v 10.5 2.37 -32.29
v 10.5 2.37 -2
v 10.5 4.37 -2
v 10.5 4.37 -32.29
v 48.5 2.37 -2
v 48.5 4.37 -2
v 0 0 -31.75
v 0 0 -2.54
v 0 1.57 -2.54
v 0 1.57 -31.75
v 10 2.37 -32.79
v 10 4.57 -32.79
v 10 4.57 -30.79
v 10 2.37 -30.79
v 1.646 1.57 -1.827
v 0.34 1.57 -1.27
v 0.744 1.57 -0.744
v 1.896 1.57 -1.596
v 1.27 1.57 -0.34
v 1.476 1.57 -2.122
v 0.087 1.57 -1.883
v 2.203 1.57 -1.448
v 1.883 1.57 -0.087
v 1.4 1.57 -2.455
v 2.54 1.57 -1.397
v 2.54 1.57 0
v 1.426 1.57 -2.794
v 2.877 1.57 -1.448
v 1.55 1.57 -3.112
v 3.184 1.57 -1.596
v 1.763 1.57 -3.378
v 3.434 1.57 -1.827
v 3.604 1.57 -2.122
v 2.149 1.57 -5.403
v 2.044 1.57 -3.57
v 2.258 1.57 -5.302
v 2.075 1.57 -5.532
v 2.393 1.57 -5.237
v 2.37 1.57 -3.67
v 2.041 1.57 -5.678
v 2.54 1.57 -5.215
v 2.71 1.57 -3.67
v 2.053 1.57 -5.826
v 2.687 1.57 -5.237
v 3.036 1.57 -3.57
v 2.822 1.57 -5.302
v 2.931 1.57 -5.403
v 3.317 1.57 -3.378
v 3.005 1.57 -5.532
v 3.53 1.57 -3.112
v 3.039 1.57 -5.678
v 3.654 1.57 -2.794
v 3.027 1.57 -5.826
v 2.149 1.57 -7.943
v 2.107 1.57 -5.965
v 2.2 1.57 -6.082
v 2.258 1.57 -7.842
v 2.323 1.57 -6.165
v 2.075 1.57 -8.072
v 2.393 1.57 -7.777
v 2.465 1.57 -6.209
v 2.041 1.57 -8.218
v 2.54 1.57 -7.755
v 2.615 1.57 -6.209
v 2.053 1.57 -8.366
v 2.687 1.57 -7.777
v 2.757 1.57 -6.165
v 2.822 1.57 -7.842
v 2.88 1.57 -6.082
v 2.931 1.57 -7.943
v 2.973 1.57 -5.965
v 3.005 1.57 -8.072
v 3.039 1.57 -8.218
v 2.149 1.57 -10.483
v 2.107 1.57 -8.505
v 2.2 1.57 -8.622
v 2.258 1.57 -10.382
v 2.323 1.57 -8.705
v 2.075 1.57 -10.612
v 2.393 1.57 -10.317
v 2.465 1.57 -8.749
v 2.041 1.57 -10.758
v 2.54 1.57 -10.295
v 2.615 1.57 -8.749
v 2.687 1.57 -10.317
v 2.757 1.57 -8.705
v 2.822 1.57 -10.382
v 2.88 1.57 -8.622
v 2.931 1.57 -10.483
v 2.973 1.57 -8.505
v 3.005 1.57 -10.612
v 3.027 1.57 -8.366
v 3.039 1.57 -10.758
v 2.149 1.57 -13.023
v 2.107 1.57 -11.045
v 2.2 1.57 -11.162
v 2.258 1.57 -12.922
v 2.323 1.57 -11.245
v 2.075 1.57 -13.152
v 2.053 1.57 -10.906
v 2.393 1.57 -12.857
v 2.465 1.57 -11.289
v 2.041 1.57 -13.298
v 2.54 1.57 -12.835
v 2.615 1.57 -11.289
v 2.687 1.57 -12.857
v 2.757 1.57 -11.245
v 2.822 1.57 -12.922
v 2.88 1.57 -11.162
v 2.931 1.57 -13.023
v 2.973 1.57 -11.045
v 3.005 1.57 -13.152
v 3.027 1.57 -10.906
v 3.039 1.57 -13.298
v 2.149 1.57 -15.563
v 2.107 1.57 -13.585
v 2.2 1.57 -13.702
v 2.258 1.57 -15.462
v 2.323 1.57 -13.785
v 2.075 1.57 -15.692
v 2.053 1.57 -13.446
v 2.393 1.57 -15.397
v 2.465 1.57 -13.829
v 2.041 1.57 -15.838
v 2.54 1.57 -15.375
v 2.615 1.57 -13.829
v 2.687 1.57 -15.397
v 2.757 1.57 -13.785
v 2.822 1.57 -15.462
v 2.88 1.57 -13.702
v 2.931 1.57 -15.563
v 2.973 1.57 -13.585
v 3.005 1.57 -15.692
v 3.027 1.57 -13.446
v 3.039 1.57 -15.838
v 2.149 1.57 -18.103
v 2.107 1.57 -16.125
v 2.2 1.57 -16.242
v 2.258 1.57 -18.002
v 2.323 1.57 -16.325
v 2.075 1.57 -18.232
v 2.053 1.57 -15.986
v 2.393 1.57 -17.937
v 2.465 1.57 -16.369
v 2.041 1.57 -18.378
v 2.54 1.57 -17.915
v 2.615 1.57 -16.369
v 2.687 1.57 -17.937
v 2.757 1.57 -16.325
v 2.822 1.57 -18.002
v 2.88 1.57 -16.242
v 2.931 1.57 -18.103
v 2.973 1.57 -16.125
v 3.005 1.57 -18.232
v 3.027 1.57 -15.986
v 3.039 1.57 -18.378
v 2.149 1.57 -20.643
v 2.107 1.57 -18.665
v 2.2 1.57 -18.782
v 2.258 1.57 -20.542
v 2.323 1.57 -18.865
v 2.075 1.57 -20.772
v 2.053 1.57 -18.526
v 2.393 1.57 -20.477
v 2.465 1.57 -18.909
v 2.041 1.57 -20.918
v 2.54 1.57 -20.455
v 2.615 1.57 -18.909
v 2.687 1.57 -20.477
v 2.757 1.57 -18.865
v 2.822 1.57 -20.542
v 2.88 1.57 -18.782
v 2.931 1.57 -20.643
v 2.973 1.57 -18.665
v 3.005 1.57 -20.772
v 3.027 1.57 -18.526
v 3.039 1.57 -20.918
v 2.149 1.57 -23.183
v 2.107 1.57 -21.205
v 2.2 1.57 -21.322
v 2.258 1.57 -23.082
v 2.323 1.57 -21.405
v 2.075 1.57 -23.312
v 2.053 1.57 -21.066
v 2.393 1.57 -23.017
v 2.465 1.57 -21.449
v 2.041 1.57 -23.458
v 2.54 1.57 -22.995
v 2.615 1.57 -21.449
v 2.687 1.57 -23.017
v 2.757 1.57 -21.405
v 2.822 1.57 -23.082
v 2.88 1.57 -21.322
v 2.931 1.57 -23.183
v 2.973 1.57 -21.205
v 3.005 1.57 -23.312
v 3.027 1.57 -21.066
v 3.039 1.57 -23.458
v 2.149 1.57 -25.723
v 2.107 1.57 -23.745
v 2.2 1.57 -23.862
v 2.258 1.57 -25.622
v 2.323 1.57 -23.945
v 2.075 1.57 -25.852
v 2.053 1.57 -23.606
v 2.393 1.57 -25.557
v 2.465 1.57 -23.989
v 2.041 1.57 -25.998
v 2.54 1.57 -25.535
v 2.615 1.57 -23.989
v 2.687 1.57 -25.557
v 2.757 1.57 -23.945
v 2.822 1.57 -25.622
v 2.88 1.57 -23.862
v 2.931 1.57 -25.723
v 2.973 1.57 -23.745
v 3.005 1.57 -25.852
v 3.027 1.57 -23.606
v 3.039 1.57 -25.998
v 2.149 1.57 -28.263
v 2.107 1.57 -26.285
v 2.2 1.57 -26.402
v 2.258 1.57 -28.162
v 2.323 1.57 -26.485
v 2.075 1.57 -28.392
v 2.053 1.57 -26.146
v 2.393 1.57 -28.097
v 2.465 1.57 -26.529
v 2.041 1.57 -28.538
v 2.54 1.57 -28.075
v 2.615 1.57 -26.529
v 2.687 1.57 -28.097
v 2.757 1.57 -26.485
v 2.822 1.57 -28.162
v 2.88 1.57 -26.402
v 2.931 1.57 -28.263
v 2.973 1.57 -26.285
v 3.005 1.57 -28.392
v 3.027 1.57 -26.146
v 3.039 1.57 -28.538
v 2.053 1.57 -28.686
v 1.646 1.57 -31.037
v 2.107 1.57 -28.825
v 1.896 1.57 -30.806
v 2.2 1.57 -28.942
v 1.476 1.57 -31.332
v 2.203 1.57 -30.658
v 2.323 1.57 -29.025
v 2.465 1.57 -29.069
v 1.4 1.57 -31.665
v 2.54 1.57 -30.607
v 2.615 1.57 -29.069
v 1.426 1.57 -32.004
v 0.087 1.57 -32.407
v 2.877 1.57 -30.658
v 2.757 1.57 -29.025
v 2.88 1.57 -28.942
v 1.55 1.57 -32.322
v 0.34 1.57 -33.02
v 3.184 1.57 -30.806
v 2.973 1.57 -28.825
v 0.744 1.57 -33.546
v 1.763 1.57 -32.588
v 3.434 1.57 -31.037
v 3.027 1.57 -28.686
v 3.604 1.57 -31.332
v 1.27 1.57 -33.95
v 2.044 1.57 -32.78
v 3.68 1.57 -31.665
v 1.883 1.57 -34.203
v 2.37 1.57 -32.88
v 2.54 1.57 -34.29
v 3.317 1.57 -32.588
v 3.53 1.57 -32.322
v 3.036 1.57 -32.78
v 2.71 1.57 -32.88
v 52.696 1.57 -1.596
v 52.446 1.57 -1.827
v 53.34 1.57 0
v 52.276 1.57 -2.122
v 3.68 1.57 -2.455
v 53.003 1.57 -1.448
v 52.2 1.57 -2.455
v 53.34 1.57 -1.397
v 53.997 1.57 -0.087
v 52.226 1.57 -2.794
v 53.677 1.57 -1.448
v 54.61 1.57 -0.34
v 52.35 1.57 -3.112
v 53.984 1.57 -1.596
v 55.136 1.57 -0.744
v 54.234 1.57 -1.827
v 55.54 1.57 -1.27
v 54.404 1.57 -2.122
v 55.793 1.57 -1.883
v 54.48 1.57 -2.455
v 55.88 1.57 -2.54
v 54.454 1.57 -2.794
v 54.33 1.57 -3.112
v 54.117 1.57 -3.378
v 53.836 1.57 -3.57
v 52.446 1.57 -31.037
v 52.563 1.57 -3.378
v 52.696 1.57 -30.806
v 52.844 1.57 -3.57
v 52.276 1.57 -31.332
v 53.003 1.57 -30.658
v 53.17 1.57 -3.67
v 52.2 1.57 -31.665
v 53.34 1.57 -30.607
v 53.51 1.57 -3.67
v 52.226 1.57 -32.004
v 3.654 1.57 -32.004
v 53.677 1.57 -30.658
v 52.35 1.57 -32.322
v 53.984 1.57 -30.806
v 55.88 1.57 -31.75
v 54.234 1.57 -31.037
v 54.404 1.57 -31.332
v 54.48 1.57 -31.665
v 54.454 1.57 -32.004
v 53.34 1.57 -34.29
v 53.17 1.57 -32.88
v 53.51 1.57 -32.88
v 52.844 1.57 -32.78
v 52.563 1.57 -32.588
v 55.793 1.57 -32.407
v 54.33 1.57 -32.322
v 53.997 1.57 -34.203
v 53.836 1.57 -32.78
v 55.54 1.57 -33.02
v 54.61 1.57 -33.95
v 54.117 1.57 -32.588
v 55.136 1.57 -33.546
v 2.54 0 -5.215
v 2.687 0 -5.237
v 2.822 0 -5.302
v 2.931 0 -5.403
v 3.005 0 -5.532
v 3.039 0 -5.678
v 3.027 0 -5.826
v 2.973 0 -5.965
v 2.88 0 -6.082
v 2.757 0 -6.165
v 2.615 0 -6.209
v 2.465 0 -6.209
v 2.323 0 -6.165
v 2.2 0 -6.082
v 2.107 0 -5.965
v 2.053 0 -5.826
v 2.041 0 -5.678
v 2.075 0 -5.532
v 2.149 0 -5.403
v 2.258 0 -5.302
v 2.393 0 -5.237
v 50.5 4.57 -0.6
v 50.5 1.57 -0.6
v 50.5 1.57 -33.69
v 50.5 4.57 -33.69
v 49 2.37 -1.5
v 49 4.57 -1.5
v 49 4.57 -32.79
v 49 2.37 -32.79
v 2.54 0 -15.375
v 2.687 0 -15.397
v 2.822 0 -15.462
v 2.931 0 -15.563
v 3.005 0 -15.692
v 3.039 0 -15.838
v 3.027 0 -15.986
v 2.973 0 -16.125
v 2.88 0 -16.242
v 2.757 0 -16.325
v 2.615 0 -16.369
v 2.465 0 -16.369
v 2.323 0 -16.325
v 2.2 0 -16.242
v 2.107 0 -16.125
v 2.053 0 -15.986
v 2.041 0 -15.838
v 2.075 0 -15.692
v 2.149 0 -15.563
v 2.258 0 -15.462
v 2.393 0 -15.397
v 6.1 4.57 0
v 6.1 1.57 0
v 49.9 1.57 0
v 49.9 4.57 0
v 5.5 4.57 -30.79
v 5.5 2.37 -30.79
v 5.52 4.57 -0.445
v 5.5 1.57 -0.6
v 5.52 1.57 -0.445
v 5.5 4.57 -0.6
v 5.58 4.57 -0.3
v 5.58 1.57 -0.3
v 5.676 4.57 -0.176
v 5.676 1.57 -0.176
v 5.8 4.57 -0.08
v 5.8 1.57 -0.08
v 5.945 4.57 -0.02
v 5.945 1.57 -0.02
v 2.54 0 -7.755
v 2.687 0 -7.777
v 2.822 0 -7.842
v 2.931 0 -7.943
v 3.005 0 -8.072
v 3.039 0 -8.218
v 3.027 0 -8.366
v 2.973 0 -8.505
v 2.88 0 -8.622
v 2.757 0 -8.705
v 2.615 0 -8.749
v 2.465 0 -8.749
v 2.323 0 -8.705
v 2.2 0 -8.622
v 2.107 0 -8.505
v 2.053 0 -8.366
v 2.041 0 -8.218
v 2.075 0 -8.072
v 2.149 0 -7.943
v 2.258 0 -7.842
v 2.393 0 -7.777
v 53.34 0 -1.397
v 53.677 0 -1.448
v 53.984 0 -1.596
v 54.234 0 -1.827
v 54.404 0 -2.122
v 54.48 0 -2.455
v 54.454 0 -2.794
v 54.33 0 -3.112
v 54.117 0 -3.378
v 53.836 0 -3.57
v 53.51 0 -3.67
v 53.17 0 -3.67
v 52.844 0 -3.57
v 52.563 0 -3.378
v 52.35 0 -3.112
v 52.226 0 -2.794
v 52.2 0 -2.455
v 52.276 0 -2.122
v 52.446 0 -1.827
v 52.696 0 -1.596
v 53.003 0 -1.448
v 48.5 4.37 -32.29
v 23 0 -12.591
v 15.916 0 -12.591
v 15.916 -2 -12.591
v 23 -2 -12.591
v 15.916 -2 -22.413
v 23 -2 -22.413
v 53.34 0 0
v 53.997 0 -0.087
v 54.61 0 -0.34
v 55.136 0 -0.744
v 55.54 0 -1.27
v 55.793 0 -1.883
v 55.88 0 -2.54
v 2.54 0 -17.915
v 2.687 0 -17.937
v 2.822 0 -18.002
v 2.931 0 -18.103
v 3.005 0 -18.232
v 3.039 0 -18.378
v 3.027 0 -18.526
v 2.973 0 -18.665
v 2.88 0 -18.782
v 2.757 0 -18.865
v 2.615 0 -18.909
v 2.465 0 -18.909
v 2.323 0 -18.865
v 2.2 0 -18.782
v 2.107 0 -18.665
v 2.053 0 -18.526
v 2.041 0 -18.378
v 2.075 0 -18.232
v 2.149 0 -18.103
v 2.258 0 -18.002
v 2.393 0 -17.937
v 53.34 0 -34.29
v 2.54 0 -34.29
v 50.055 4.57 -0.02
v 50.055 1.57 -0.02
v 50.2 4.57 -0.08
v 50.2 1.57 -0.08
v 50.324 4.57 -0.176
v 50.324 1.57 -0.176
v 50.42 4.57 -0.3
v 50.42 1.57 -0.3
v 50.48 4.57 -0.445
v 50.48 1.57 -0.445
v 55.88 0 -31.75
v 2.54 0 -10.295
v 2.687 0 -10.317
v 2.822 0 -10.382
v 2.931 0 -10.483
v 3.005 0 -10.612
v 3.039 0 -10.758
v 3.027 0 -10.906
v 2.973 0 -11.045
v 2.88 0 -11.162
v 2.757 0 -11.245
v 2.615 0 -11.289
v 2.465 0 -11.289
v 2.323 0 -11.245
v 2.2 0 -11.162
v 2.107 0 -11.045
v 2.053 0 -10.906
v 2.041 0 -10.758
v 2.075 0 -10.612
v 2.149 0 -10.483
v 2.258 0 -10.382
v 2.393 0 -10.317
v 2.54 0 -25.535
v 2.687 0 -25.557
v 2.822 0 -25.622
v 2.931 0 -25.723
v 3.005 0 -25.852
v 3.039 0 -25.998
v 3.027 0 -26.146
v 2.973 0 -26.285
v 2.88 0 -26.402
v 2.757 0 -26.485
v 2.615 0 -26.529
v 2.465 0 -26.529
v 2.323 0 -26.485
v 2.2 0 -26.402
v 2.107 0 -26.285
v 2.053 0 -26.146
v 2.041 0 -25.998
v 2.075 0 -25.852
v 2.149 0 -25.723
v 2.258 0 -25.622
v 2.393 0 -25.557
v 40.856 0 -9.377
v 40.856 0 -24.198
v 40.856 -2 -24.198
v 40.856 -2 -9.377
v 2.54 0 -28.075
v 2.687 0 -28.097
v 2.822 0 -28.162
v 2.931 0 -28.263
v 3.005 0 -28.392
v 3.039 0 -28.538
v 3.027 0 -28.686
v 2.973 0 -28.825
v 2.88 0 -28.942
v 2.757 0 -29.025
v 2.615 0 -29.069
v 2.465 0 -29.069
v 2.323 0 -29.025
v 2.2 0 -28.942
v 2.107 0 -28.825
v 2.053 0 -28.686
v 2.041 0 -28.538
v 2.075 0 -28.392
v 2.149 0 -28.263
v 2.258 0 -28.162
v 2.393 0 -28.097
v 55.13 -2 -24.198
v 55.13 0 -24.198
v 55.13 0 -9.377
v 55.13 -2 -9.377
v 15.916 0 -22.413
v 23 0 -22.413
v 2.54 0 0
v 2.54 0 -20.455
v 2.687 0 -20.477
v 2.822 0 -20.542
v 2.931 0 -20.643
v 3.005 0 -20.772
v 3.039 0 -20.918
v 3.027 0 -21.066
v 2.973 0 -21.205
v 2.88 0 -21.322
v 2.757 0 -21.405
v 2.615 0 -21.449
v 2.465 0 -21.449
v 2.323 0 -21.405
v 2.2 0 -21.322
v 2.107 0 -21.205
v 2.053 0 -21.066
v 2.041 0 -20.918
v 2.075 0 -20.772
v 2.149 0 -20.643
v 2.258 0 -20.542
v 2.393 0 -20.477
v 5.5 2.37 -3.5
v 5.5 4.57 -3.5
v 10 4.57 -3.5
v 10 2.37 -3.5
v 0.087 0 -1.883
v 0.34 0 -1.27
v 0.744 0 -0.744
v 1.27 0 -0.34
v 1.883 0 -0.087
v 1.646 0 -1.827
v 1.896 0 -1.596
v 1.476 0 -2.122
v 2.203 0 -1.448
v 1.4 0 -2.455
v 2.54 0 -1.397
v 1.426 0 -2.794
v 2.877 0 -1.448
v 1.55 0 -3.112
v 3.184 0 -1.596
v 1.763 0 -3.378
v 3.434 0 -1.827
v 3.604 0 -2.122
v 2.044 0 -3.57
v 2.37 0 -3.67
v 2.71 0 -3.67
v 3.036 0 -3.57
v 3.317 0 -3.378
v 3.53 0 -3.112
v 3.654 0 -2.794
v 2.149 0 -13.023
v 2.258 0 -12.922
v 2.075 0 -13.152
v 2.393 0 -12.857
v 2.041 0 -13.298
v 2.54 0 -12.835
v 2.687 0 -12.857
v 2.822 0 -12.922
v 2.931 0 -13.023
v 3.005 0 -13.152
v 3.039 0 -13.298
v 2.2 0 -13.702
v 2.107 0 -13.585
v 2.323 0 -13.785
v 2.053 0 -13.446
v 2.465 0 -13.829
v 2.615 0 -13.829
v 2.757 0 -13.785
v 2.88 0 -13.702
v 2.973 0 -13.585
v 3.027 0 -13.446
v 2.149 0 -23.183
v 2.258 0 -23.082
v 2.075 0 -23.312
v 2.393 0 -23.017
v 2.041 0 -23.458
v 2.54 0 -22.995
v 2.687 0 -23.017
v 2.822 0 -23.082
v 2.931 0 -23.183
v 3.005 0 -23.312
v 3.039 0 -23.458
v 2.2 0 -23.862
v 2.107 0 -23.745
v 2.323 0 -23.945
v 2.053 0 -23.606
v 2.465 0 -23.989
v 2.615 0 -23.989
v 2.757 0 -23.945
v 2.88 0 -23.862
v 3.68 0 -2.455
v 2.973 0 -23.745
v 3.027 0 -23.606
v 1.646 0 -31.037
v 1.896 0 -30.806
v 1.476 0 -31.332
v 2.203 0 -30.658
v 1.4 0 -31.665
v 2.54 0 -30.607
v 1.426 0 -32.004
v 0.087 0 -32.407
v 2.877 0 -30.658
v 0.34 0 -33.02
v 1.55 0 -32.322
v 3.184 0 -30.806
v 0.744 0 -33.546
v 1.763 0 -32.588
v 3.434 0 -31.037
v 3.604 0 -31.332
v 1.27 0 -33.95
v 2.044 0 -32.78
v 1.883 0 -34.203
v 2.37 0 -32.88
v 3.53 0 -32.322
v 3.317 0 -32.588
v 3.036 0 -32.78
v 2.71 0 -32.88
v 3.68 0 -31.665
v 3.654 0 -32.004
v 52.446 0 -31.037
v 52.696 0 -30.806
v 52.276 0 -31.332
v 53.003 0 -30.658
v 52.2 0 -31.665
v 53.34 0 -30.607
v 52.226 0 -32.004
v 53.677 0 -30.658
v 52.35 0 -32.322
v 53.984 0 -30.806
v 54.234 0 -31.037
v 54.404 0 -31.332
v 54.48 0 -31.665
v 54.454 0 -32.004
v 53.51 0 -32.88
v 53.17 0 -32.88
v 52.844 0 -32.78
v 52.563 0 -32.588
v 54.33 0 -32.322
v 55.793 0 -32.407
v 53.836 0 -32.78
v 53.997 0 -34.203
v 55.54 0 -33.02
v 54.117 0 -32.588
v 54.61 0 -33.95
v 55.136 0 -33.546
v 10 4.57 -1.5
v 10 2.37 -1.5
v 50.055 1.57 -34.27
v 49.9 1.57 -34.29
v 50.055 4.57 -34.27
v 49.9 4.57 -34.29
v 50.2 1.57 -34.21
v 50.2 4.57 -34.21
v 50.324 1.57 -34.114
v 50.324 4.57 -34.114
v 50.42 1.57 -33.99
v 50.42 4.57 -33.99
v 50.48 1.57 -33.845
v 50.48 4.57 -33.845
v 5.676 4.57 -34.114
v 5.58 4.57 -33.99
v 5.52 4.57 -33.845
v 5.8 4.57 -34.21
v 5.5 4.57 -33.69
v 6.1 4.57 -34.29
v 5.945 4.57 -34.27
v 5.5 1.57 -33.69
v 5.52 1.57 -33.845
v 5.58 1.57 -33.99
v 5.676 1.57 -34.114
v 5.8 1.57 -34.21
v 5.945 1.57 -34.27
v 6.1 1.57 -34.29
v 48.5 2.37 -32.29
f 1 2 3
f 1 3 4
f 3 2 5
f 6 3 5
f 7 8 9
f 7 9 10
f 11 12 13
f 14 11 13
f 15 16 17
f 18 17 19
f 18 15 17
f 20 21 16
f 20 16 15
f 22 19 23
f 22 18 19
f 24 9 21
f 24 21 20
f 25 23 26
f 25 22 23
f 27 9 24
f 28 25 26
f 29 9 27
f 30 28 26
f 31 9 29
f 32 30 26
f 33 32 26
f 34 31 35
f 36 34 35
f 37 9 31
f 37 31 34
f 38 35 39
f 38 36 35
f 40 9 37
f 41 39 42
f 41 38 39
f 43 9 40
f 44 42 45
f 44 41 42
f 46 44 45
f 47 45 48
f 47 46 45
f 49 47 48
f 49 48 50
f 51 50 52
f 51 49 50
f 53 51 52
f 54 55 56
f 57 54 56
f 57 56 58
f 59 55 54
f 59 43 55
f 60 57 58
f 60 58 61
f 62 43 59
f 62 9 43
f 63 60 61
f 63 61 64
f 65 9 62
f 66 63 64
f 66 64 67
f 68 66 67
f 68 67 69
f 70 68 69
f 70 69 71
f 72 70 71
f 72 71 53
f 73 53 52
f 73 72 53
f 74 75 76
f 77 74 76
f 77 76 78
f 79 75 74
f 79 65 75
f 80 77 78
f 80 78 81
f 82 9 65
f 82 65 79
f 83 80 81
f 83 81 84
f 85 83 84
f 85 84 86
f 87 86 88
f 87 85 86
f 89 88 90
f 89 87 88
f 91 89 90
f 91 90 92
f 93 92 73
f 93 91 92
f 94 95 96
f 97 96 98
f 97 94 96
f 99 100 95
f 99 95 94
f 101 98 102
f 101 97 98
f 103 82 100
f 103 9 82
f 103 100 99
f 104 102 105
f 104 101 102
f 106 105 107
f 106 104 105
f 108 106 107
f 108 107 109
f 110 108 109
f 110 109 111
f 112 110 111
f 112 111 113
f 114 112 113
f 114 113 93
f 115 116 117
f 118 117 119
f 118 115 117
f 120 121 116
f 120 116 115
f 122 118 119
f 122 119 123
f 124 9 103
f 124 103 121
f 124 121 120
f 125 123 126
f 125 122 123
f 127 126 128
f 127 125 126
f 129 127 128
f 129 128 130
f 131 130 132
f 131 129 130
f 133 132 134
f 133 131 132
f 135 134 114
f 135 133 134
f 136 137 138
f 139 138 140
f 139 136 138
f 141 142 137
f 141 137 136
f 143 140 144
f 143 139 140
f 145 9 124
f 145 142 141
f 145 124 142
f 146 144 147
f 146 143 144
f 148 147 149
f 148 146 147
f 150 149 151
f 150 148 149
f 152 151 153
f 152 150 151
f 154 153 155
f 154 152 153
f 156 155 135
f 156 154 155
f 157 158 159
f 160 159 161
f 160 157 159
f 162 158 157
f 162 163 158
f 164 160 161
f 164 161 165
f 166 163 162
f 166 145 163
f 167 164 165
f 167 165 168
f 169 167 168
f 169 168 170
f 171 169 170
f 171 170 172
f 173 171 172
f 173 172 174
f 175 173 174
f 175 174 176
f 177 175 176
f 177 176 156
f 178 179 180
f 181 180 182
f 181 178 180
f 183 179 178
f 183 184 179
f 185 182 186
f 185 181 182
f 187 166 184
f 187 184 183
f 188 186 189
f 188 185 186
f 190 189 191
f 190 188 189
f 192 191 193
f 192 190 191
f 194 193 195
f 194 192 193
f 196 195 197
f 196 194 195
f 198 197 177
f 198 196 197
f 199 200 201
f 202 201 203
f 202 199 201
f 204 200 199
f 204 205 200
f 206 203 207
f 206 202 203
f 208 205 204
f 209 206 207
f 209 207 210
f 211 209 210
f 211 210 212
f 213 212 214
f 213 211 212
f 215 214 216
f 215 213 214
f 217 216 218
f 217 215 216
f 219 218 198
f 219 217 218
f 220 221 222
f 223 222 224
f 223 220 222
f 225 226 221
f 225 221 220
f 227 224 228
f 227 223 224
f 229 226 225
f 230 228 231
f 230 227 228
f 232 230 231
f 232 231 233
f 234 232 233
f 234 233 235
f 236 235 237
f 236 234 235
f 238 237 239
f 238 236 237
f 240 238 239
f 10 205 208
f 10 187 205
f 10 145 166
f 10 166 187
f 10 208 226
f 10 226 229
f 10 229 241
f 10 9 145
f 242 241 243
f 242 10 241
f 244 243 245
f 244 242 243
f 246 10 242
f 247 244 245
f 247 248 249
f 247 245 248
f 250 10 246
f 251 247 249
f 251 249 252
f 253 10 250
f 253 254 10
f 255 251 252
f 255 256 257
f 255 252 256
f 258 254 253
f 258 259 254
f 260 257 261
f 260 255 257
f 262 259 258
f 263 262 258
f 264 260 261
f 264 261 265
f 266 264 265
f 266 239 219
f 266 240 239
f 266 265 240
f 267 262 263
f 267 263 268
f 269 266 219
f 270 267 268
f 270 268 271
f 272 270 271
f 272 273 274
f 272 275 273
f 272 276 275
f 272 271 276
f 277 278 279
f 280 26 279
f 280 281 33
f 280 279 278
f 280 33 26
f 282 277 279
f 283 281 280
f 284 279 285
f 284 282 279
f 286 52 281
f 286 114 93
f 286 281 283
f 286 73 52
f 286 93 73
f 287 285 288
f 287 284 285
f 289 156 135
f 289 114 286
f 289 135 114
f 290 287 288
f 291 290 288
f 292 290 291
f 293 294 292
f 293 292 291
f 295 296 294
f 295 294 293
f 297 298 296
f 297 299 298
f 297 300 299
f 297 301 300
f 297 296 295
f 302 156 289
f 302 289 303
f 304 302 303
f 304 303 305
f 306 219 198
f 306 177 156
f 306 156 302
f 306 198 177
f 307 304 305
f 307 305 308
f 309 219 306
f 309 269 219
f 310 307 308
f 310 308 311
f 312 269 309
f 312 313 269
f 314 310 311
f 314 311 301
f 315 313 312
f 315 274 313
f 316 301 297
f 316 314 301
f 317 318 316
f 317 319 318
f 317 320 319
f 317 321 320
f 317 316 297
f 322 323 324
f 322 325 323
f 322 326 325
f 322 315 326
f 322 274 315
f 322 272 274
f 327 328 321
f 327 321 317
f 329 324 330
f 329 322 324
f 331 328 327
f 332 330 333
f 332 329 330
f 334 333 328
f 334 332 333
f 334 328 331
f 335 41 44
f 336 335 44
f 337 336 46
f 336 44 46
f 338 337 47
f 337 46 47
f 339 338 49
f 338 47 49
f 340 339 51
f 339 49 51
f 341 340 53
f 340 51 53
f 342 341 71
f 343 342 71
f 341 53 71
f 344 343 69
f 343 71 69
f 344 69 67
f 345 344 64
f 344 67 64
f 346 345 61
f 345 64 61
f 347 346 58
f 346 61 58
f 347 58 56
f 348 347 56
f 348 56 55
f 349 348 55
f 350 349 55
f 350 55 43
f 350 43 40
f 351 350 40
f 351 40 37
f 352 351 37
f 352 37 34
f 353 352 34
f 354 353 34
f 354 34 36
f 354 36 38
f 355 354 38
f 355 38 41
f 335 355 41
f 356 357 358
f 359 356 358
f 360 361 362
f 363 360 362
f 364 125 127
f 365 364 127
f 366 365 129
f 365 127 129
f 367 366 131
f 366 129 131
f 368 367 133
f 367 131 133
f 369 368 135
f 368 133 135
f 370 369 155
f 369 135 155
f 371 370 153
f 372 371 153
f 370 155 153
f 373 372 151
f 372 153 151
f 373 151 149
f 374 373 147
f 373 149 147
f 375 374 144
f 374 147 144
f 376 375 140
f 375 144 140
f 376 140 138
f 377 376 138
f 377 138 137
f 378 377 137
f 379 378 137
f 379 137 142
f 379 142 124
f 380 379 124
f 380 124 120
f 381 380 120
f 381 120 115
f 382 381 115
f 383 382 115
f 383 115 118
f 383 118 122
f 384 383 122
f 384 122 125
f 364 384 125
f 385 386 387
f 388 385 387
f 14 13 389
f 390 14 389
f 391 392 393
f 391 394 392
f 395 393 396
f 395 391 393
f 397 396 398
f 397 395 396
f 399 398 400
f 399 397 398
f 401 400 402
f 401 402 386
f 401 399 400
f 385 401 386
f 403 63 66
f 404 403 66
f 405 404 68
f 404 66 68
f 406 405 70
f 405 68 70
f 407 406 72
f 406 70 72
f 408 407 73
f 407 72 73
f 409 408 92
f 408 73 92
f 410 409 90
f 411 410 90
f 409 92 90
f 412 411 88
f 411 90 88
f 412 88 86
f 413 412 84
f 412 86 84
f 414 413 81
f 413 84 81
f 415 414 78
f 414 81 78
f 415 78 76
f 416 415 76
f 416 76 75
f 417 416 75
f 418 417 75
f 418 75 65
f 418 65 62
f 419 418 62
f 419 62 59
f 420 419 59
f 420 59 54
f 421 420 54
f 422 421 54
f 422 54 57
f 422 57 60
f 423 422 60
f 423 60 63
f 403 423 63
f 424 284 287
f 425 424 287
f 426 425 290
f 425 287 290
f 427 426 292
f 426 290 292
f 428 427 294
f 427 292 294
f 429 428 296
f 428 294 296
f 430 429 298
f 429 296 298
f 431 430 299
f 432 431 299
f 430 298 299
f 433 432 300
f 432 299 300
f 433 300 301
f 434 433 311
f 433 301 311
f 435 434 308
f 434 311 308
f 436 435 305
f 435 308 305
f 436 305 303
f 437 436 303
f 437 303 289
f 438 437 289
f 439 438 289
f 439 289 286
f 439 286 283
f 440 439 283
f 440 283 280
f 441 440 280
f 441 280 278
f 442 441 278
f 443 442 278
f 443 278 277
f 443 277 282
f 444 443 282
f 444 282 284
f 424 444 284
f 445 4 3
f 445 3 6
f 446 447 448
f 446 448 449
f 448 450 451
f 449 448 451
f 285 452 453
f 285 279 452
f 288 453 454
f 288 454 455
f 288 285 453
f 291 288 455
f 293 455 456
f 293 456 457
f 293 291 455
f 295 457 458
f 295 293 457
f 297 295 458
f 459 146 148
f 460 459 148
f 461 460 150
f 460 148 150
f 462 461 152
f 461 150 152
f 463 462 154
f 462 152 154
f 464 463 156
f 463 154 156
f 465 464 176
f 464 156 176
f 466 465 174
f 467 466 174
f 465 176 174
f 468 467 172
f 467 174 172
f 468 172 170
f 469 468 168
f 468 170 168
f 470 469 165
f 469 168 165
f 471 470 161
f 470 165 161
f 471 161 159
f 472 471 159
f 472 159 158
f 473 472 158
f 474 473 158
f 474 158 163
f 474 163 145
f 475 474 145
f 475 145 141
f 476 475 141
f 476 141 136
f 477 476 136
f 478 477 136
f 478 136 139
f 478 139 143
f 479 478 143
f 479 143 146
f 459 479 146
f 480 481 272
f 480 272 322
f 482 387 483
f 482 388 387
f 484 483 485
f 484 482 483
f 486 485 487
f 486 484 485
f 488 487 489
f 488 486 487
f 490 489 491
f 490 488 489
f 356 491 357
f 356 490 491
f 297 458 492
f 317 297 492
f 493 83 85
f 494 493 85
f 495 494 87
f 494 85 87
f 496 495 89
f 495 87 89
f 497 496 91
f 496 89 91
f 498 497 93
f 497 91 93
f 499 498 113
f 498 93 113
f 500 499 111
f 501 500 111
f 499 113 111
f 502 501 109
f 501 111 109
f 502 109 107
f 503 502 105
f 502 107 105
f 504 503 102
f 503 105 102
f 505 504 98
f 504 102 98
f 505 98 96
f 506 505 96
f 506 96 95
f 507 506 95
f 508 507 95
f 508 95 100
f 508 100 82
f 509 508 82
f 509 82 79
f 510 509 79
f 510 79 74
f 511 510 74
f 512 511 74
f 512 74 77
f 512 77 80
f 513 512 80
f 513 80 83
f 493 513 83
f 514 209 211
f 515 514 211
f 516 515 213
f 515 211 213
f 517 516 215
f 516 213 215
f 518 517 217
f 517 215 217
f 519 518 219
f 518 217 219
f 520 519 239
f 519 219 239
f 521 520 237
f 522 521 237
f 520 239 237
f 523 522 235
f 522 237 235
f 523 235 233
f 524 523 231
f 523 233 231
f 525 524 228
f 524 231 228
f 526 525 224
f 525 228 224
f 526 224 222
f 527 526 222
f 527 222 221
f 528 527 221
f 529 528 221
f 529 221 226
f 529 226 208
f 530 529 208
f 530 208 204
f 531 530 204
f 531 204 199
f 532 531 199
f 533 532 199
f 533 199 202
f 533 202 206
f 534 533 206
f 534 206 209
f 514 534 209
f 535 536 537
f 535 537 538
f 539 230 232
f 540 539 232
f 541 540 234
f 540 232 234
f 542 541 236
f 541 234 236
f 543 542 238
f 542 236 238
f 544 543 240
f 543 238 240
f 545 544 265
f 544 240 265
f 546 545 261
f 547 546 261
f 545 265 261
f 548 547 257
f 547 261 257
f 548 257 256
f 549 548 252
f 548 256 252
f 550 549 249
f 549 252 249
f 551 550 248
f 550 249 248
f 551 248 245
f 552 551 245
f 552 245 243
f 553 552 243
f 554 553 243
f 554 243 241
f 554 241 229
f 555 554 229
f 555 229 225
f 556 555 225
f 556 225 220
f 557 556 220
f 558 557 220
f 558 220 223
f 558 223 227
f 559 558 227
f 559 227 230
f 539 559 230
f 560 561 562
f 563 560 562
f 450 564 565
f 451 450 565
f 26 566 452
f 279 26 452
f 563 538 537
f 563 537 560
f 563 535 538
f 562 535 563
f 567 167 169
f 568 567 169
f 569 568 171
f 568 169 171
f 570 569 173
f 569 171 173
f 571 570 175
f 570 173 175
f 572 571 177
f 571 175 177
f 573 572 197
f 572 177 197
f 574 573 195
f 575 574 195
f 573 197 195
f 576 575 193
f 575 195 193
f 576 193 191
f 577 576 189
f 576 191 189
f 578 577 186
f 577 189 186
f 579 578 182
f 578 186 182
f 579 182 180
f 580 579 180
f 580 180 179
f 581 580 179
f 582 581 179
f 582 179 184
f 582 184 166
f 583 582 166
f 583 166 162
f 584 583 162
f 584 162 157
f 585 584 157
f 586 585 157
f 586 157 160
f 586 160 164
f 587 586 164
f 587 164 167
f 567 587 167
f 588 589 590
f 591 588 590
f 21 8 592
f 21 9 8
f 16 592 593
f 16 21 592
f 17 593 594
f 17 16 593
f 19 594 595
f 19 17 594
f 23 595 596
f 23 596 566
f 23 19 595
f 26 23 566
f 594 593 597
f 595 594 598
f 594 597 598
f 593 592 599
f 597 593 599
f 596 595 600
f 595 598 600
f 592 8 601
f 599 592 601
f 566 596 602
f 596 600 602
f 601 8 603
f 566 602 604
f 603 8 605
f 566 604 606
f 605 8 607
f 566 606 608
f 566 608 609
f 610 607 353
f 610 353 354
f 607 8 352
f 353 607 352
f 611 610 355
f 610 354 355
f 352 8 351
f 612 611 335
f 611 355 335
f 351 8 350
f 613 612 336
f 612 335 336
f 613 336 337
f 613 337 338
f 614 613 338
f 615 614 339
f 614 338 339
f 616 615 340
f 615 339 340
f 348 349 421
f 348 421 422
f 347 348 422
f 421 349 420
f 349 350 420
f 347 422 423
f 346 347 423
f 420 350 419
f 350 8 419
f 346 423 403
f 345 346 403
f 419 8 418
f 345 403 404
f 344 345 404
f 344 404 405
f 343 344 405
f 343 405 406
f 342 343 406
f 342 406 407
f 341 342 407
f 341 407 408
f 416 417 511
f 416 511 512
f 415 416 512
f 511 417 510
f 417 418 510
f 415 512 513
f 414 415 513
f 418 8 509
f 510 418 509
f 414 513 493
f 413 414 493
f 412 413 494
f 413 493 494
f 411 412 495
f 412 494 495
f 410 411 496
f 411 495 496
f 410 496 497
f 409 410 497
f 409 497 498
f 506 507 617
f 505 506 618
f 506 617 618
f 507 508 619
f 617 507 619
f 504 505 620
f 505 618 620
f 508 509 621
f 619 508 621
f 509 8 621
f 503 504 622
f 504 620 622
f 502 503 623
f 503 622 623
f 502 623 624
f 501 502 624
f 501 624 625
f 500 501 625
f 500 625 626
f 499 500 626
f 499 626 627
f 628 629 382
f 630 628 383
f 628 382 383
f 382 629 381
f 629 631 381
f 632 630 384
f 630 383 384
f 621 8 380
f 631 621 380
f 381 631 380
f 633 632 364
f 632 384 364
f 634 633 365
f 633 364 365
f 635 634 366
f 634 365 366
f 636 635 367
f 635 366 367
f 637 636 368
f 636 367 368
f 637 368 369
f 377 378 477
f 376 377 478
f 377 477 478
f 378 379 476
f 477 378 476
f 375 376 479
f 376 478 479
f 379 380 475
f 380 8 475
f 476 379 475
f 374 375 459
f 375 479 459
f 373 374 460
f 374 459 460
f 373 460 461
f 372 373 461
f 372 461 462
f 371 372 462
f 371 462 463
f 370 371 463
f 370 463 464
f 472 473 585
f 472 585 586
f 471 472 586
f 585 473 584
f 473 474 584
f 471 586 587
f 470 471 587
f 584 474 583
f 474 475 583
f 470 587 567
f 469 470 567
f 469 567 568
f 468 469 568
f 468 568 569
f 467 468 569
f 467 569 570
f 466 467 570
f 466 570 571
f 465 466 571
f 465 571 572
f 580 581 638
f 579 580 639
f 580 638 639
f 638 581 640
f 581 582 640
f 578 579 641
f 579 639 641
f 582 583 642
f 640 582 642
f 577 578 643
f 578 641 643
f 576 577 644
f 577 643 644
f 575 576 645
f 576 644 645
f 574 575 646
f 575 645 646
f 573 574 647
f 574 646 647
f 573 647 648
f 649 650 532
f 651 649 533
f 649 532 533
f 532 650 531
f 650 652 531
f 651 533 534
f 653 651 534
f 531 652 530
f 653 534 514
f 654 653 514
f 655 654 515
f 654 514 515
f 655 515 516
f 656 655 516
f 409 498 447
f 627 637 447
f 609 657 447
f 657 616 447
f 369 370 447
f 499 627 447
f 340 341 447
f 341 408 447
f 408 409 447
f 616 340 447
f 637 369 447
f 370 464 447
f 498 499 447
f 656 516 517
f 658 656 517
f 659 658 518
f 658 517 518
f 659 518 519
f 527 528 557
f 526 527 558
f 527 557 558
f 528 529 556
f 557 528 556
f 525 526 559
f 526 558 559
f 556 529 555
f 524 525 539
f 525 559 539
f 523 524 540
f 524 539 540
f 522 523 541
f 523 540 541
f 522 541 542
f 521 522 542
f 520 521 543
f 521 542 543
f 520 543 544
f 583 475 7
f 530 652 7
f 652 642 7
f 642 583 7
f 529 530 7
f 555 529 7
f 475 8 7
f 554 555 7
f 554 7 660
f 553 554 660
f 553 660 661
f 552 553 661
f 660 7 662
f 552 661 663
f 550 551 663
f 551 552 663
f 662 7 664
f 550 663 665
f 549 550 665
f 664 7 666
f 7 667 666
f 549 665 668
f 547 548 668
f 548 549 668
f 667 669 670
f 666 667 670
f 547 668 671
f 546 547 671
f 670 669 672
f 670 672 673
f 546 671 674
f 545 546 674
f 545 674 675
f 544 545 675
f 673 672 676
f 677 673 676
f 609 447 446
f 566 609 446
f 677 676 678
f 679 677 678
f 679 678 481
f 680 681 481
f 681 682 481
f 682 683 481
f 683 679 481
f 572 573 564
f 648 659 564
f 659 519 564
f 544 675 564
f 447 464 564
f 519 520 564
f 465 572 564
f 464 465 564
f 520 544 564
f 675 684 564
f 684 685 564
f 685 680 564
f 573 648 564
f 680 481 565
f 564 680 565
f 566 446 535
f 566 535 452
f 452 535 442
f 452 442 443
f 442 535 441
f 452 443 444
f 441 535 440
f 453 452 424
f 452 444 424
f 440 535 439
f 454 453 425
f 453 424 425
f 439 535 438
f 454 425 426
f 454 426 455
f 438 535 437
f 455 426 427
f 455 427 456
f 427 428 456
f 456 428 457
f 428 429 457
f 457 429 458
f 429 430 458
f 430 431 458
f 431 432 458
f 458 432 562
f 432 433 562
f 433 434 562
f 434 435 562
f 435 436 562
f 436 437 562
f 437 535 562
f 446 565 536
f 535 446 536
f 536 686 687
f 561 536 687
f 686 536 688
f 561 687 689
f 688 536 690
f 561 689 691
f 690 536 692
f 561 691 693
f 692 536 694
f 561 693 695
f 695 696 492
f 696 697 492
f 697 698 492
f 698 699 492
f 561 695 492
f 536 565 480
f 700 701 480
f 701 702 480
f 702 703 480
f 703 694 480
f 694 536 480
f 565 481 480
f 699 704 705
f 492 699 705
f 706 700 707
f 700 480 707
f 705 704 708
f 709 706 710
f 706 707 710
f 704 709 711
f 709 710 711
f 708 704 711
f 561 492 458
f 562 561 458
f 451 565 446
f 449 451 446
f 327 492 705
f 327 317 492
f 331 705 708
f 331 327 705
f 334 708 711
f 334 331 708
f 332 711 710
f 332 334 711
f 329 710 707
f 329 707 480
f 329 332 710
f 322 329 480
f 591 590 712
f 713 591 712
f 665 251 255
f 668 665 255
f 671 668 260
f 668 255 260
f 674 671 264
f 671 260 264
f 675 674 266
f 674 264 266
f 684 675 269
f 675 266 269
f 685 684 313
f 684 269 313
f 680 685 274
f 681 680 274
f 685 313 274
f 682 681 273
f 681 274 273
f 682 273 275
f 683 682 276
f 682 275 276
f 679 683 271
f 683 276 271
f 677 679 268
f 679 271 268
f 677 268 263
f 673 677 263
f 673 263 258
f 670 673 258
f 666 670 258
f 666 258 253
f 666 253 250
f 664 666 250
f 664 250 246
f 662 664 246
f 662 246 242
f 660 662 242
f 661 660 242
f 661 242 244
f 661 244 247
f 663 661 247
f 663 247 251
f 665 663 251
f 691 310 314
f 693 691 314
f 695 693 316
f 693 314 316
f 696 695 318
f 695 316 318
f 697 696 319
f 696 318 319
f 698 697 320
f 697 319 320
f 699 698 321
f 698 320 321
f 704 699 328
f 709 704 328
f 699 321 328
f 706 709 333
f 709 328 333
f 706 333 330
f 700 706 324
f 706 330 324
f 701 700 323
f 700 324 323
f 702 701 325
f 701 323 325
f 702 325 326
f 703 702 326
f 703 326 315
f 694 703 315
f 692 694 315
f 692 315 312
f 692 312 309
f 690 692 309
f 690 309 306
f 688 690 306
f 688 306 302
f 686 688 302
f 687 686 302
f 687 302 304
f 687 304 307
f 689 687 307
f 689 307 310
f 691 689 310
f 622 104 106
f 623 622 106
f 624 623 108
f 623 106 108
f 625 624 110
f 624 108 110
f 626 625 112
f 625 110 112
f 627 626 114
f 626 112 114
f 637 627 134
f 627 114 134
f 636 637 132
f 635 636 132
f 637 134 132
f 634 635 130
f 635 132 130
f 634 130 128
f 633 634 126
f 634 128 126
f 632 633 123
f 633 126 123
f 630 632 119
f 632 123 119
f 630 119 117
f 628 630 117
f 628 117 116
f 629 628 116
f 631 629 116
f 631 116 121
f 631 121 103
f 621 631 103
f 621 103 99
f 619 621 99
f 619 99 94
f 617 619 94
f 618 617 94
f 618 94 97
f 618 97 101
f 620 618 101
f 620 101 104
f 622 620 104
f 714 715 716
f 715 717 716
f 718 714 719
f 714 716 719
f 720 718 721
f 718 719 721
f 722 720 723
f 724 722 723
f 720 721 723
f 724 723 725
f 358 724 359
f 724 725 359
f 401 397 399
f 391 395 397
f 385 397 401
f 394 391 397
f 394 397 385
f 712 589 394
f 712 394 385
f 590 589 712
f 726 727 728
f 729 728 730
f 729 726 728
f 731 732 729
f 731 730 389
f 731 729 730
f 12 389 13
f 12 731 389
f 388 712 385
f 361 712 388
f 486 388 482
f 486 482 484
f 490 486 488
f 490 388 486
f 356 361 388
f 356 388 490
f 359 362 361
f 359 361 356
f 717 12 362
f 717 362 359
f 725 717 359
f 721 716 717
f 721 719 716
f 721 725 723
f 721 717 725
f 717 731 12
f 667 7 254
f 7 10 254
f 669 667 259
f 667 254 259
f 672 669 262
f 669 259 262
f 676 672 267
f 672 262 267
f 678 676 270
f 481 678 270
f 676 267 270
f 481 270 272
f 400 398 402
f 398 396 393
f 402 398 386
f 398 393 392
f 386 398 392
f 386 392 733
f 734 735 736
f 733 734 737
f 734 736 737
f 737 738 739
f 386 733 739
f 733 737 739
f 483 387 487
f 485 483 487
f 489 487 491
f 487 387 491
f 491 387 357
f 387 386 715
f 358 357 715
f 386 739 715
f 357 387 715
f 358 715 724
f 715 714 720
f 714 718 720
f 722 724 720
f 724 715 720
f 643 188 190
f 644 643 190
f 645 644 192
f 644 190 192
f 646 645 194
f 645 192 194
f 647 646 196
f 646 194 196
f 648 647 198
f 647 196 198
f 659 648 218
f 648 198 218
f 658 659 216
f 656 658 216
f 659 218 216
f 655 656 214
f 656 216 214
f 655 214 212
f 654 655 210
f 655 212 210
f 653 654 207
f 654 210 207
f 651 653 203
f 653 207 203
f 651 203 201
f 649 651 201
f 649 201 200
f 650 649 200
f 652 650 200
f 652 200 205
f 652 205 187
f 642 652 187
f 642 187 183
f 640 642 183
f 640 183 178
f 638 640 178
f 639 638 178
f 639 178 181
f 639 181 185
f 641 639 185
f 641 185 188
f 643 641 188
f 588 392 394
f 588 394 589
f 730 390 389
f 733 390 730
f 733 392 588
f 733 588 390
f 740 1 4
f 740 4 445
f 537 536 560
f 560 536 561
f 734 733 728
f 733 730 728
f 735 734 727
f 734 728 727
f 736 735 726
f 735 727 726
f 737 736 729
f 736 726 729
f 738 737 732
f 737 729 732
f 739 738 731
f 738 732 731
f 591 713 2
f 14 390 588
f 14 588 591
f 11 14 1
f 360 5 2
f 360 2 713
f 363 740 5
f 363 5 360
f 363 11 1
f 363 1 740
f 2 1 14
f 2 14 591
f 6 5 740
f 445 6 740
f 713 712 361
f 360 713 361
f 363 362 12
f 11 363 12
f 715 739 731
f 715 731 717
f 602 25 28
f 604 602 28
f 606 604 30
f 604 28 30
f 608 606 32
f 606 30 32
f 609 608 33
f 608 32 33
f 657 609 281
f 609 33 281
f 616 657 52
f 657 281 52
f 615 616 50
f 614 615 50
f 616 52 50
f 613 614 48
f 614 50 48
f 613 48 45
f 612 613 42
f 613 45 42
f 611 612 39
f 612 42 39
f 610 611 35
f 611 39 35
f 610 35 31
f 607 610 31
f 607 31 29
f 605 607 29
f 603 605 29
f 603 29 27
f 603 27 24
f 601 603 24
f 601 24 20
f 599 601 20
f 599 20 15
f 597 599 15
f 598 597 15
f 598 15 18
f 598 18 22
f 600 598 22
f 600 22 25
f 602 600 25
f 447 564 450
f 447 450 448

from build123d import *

# Parameters (mm, degrees)
SKETCH1_W                                     = 55.88
SKETCH1_H                                     = 34.29
CIRCUIT_BOARD_DEPTH                           = 1.57
FILLET1_R                                     = 2.54
SKETCH2_R                                     = 1.143
CUT_EXTRUDE1_DEPTH                            = 66.580815792
SKETCH3_R                                     = 0.5
CUT_EXTRUDE2_DEPTH                            = 66.580815792
CONNECTOR_HOLES_COUNT                         = 10
CONNECTOR_HOLES_PITCH                         = 2.54
SKETCH4_W                                     = 7.083224401
SKETCH4_H                                     = 9.821277531
SKETCH4_W_2                                   = 14.273419681
SKETCH4_H_2                                   = 14.821200637
IC1_AND_SD_CARD_SLOT_APPROXIMATE_SIZE_A_DEPTH = 2
SKETCH5_W                                     = 45
SKETCH5_H                                     = 34.29
BOSS_EXTRUDE3_DEPTH                           = 3
CUT_EXTRUDE3_DEPTH                            = 2.2
SKETCH7_W                                     = 38
SKETCH7_H                                     = 30.29
BOSS_EXTRUDE4_DEPTH                           = 2
FILLET2_R                                     = 0.6


with BuildPart() as part:
    # Sketch1 → Circuit Board (new body)
    with BuildSketch(Plane(origin=(0, 0, 0), x_dir=(1, 0, 0), z_dir=(0, 1, 0))):
        with Locations((27.94, 17.145)):
            Rectangle(SKETCH1_W, SKETCH1_H)
    extrude(amount=CIRCUIT_BOARD_DEPTH)

    # Fillet1
    fillet1_edges = [part.edges().sort_by_distance(p)[0] for p in [
        (0, 0.785, -34.29),
        (55.88, 0.785, -34.29),
        (55.88, 0.785, 0),
        (0, 0.785, 0),
    ]]
    fillet(fillet1_edges, radius=FILLET1_R)

    # Sketch2 → Cut-Extrude1 (cut, through all)
    with BuildSketch(Plane(origin=(0, 1.57, 0), x_dir=(1, 0, 0), z_dir=(0, 1, 0))):
        with Locations(Location((2.54, 31.75, 0), (0, 0, 270))):
            Circle(SKETCH2_R)
        with Locations(Location((53.34, 31.75, 0), (0, 0, 270))):
            Circle(SKETCH2_R)
        with Locations(Location((53.34, 2.54, 0), (0, 0, 270))):
            Circle(SKETCH2_R)
        with Locations(Location((2.54, 2.54, 0), (0, 0, 270))):
            Circle(SKETCH2_R)
    extrude(amount=-CUT_EXTRUDE1_DEPTH, mode=Mode.SUBTRACT)

    # Sketch3 → Cut-Extrude2 (cut, through all)
    with BuildSketch(Plane(origin=(0, 1.57, 0), x_dir=(1, 0, 0), z_dir=(0, 1, 0))):
        with Locations(Location((2.54, 5.715, 0), (0, 0, 270))):
            Circle(SKETCH3_R)
    cut_extrude2 = extrude(amount=-CUT_EXTRUDE2_DEPTH, mode=Mode.SUBTRACT)

    # Connector Holes: Cut-Extrude2 ×10
    with Locations(*[(0, 0, -i * CONNECTOR_HOLES_PITCH) for i in range(1, CONNECTOR_HOLES_COUNT)]):
        add(cut_extrude2, mode=Mode.SUBTRACT)

    # Sketch4 → IC1 and SD card slot (approximate size and location) (add)
    with BuildSketch(Plane.XZ):
        with Locations((19.457987587, -17.502137365)):
            Rectangle(SKETCH4_W, SKETCH4_H)
        with Locations((47.993177866, -16.787862636)):
            Rectangle(SKETCH4_W_2, SKETCH4_H_2)
    extrude(amount=IC1_AND_SD_CARD_SLOT_APPROXIMATE_SIZE_A_DEPTH)


with BuildPart() as body_2:
    # Sketch5 → Boss-Extrude3 (new body)
    with BuildSketch(Plane(origin=(0, 1.57, 0), x_dir=(1, 0, 0), z_dir=(0, 1, 0))):
        with Locations((28, 17.145)):
            Rectangle(SKETCH5_W, SKETCH5_H)
    extrude(amount=BOSS_EXTRUDE3_DEPTH)

    # Sketch6 → Cut-Extrude3 (cut)
    with BuildSketch(Plane(origin=(0, 4.57, 0), x_dir=(1, 0, 0), z_dir=(0, 1, 0))):
        Polygon((10, 32.79), (10, 30.79), (5.5, 30.79), (5.5, 3.5), (10, 3.5), (10, 1.5), (49, 1.5), (49, 32.79), align=None)
    extrude(amount=-CUT_EXTRUDE3_DEPTH, mode=Mode.SUBTRACT)

    # Sketch7 → Boss-Extrude4 (add)
    with BuildSketch(Plane(origin=(0, 2.37, 0), x_dir=(1, 0, 0), z_dir=(0, 1, 0))):
        with Locations((29.5, 17.145)):
            Rectangle(SKETCH7_W, SKETCH7_H)
    extrude(amount=BOSS_EXTRUDE4_DEPTH)

    # Fillet2
    fillet2_edges = [body_2.edges().sort_by_distance(p)[0] for p in [
        (5.5, 3.07, -34.29),
        (50.5, 3.07, -34.29),
        (50.5, 3.07, 0),
        (5.5, 3.07, 0),
    ]]
    fillet(fillet2_edges, radius=FILLET2_R)


solid = Compound([part.part, body_2.part])
